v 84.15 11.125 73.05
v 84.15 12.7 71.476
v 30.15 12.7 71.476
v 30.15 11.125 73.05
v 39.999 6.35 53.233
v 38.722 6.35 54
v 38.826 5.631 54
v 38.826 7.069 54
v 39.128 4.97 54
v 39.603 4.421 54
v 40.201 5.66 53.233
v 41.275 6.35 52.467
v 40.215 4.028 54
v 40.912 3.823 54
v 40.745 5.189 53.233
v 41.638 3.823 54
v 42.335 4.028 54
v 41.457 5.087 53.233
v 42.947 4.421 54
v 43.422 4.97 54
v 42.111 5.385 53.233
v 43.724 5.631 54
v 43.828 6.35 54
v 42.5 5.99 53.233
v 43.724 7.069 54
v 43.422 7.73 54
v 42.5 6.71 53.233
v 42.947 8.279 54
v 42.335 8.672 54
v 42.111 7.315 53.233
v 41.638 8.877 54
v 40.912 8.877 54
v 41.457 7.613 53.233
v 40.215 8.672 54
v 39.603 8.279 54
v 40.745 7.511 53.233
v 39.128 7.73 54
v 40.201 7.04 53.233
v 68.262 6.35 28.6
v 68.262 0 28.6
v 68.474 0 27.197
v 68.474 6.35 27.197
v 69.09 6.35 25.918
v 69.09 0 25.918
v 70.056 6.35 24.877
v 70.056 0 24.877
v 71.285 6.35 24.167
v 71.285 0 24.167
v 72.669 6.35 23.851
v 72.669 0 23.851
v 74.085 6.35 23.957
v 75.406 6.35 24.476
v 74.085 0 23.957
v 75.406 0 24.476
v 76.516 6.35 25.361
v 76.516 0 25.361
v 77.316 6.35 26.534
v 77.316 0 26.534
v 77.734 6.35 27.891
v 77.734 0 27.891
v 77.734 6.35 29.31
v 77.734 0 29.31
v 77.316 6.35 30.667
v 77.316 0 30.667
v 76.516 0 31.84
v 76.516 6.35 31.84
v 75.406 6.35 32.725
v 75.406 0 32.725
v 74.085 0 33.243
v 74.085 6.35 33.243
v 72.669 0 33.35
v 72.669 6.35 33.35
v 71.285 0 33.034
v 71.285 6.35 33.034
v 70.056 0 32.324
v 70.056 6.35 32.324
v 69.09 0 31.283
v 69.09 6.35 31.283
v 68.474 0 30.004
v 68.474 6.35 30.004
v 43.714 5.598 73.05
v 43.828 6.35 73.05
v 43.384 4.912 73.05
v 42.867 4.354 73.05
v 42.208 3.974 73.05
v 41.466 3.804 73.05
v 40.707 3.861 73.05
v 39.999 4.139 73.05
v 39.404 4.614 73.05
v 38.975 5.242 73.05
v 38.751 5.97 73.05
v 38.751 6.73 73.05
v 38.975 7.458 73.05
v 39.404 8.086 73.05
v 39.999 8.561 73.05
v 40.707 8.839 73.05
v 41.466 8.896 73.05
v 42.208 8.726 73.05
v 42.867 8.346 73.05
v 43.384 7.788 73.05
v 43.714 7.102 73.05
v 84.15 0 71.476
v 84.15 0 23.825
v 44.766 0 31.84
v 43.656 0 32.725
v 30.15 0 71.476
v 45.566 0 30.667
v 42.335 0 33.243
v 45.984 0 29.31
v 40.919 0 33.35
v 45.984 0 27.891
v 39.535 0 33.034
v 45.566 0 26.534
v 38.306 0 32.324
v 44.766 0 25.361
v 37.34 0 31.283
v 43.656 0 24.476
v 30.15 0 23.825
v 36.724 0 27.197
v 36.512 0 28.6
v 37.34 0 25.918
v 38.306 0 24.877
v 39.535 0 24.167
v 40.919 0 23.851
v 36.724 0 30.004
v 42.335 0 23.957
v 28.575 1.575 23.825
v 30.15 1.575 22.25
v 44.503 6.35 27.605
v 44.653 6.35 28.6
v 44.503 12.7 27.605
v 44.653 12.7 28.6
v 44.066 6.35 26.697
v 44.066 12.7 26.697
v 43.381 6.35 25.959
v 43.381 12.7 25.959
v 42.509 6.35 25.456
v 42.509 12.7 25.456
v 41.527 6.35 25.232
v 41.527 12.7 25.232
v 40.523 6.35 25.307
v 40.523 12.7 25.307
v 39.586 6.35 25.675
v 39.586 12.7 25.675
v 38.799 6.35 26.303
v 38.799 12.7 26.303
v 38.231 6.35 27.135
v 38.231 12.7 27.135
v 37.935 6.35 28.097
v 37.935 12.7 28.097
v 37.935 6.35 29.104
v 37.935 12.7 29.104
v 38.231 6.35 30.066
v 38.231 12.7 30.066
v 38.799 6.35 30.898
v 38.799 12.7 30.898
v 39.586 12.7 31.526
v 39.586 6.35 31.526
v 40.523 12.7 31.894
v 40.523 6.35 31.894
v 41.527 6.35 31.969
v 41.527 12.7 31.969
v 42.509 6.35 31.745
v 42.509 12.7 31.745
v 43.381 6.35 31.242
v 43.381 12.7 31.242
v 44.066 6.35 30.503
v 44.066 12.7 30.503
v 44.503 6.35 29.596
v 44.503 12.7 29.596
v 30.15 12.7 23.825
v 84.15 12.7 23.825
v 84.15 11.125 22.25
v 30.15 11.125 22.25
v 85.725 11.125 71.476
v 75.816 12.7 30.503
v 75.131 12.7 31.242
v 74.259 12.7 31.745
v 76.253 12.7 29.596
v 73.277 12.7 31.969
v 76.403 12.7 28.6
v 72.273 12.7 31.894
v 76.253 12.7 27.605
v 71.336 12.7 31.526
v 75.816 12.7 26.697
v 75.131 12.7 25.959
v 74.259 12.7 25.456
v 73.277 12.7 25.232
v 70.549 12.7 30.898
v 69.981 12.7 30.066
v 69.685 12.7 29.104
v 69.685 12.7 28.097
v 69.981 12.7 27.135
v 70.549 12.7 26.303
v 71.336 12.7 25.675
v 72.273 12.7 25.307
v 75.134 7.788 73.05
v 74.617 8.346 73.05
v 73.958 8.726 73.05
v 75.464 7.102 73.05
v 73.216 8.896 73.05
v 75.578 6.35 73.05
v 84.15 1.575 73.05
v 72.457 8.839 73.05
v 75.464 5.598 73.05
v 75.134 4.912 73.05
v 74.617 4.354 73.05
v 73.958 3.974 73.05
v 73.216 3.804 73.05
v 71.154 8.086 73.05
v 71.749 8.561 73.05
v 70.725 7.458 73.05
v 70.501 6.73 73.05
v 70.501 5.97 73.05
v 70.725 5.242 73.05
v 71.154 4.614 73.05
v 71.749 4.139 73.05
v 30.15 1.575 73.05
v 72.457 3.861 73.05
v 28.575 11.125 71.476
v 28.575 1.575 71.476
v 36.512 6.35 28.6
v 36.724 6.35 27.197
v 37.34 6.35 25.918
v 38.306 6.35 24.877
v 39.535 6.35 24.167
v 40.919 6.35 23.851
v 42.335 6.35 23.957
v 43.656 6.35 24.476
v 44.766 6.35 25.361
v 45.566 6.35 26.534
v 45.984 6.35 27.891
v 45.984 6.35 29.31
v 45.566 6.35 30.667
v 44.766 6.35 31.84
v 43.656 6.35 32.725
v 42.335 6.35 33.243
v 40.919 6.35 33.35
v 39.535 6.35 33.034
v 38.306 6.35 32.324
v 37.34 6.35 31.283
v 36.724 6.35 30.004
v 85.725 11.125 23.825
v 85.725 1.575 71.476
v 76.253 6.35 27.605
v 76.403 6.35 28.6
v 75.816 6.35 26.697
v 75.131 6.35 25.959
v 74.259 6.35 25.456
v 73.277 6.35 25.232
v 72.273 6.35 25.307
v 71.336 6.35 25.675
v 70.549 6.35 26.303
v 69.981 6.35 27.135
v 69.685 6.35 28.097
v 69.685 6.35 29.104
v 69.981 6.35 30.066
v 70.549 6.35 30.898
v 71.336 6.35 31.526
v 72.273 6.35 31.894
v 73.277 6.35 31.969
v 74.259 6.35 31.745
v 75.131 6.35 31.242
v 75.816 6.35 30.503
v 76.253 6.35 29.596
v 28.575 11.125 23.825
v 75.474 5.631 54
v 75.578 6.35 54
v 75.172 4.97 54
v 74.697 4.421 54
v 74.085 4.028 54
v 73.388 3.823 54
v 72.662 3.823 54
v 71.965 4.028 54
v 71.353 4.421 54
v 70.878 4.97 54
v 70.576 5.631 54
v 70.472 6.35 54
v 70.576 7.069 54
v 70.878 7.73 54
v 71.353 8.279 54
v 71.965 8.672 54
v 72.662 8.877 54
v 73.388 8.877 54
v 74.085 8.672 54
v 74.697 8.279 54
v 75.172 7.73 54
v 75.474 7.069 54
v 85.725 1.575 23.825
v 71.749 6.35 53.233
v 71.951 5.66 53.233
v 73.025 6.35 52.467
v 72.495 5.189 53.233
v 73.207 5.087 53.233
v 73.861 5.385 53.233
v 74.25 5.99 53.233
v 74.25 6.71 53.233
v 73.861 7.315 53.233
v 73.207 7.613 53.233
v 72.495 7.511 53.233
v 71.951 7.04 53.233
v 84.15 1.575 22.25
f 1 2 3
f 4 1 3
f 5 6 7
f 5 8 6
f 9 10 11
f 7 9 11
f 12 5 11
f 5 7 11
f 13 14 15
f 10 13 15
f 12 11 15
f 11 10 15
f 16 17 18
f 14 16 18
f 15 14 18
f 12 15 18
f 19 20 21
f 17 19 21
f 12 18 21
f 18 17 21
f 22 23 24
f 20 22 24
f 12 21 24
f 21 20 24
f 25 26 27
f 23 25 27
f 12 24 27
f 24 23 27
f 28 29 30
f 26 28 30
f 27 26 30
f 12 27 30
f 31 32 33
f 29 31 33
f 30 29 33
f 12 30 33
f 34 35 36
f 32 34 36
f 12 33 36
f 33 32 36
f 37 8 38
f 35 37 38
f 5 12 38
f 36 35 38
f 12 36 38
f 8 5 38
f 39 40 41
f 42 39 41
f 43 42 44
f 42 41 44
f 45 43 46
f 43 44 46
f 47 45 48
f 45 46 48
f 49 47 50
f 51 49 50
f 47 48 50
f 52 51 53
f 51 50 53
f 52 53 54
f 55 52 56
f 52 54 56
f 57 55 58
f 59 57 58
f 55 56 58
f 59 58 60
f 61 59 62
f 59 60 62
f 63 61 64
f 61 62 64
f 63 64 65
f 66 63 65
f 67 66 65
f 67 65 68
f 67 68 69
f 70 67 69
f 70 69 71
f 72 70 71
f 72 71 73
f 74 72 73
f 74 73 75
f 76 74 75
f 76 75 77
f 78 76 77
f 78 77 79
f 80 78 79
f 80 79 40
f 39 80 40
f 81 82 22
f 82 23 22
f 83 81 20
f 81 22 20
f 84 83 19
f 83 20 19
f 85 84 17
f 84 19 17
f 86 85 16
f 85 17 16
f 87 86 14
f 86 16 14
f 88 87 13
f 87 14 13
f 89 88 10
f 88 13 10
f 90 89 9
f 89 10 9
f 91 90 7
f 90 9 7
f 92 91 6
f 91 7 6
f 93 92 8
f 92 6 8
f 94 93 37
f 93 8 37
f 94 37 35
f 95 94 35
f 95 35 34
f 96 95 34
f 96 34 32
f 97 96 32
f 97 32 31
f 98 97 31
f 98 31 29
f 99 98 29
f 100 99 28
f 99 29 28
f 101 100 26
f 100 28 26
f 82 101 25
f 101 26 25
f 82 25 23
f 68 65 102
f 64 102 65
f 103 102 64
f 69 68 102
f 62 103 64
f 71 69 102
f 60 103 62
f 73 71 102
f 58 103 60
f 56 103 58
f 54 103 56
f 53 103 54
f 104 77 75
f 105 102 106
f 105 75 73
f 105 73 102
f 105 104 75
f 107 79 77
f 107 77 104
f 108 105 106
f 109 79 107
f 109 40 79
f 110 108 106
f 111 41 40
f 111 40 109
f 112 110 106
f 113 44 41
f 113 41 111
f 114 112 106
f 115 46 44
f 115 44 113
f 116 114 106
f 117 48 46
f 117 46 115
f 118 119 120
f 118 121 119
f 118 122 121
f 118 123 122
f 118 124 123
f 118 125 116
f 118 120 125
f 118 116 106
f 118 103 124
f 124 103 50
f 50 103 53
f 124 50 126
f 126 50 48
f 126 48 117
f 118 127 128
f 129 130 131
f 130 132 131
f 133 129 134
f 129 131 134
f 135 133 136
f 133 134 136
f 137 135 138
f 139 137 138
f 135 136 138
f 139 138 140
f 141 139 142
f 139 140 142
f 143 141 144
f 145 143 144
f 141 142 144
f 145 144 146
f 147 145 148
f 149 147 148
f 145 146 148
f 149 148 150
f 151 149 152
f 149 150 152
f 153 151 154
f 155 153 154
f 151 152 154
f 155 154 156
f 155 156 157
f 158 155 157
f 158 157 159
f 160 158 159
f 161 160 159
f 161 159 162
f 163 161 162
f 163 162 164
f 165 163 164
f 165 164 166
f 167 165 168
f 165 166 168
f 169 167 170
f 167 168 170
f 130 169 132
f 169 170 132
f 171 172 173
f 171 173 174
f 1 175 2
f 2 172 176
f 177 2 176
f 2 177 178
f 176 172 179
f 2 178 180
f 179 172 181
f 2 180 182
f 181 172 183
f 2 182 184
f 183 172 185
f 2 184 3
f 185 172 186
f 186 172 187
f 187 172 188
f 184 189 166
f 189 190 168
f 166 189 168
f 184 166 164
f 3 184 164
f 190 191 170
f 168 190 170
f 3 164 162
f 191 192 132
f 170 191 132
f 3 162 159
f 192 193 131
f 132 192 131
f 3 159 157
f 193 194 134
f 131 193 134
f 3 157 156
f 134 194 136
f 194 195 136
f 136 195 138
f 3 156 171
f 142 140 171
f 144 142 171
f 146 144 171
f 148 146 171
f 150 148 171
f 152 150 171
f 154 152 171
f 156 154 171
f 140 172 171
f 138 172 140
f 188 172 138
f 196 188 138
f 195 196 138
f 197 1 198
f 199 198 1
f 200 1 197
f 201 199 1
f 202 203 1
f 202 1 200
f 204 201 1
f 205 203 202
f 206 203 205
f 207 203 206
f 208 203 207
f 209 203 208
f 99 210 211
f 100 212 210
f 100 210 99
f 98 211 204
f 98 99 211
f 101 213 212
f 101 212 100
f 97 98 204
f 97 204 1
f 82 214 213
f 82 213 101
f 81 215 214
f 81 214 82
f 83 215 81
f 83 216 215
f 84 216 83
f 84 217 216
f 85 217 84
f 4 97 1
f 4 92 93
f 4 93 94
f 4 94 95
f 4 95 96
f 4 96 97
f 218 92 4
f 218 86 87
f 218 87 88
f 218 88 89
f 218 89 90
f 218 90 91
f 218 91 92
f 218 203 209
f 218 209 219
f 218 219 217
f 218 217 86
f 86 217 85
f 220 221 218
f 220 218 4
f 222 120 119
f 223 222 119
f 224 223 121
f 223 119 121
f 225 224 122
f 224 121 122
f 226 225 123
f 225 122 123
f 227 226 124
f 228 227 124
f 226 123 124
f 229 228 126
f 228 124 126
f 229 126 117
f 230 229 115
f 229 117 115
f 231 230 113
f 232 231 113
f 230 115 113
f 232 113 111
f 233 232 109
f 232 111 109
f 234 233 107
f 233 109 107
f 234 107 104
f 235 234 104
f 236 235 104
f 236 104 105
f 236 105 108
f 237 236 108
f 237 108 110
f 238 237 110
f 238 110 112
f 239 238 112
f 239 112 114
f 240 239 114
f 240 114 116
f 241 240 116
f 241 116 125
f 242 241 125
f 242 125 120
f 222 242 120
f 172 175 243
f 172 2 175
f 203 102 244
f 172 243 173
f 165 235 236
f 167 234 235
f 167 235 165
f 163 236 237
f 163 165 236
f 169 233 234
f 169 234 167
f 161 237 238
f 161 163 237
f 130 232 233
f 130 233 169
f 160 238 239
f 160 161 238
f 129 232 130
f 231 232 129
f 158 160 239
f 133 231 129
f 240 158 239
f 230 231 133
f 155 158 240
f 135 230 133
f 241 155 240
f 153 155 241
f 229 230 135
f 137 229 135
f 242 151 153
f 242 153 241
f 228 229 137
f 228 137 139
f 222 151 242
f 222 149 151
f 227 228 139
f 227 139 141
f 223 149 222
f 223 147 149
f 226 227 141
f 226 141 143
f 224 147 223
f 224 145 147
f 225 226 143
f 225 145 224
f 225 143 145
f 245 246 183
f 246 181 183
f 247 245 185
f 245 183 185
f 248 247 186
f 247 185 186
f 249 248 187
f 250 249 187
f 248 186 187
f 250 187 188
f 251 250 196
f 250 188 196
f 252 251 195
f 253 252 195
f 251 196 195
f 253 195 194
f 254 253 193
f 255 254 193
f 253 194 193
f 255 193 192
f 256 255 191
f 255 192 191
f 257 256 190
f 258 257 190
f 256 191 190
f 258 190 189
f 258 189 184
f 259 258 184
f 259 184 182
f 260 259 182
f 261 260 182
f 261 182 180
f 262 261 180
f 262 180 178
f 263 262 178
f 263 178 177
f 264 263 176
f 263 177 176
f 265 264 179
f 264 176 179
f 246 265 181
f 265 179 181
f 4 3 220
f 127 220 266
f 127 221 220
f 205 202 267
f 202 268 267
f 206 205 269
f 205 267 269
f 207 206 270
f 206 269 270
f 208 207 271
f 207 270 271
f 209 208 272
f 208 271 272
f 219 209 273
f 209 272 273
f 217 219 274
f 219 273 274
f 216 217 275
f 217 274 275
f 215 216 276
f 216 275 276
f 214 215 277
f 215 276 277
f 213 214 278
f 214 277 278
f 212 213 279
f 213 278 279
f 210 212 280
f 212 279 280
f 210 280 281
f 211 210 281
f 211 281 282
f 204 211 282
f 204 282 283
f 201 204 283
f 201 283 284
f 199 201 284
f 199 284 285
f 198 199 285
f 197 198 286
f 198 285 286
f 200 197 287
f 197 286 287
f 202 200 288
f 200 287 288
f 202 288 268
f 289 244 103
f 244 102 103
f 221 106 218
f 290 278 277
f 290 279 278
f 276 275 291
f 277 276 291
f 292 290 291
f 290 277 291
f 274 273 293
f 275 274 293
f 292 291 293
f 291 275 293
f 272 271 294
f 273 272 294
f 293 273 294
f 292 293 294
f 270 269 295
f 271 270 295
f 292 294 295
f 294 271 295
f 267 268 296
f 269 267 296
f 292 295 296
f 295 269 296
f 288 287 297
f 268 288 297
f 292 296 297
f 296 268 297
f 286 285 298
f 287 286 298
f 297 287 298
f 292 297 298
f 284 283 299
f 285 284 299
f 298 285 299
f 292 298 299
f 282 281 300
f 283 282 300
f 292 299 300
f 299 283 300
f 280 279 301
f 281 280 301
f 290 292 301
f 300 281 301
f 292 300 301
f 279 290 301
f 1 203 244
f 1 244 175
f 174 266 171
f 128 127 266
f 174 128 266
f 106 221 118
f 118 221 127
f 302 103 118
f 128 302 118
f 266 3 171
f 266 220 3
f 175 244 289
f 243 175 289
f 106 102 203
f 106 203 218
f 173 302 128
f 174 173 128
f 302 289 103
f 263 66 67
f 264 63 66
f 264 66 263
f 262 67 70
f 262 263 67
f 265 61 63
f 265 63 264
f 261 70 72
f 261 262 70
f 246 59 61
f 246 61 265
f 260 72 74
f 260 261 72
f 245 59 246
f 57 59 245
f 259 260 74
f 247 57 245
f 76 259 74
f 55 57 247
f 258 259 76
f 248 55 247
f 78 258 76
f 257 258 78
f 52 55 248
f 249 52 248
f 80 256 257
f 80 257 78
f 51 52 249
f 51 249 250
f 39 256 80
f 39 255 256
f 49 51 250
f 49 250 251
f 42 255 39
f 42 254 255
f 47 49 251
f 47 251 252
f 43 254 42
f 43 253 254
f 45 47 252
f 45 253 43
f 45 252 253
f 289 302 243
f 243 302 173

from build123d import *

# Parameters (mm, degrees)
F0_W           = 57.15
F0_H           = 50.8
F1_DEPTH       = 12.7
F2_D           = 6.7564
F2_CBORE_D     = 9.525
F2_CBORE_DEPTH = 6.35
F4_D           = 5.1054
F4_DEPTH       = 19.05
F4_TIP         = 1.5338169022
F5_SIZE        = 1.5748
F6_ANGLE       = 180


with BuildPart() as f1:
    # F0 (on Front) → F1 (new body)
    with BuildSketch(Plane.XZ):
        Rectangle(F0_W, F0_H)
    extrude(amount=-F1_DEPTH)

    # F2 (through all)
    with Locations(Plane.XZ):
        with Locations((-15.875, 19.05), (15.875, 19.05)):
            CounterBoreHole(F2_D / 2, F2_CBORE_D / 2, F2_CBORE_DEPTH)

    # F4
    with Locations(Plane(origin=(0, 0, -25.4), x_dir=(1, 0, 0), z_dir=(0, 0, -1))):
        with Locations((15.875, -6.35), (-15.875, -6.35)):
            Hole(F4_D / 2, depth=F4_DEPTH)
            with Locations((0, 0, -(F4_DEPTH + F4_TIP / 2))):  # 118° drill point
                Cone(0, F4_D / 2, F4_TIP, mode=Mode.SUBTRACT)

    # F5
    f5_edges = [f1.edges().sort_by_distance(p)[0] for p in [
        (28.575, 12.7, 0),
        (28.575, 0, 0),
        (-28.575, 0, 0),
        (-28.575, 12.7, 0),
        (0, 0, -25.4),
        (-28.575, 6.35, -25.4),
        (0, 12.7, -25.4),
        (28.575, 6.35, -25.4),
        (28.575, 6.35, 25.4),
        (-28.575, 6.35, 25.4),
        (0, 0, 25.4),
        (0, 12.7, 25.4),
    ]]
    chamfer(f5_edges, length=F5_SIZE)


with BuildPart() as f1_1:
    # F6: moved
    add(f1.part.rotate(Axis((28.575, 6.35, 23.8252), (0, 1, 0)), F6_ANGLE))


solid = f1_1.part
